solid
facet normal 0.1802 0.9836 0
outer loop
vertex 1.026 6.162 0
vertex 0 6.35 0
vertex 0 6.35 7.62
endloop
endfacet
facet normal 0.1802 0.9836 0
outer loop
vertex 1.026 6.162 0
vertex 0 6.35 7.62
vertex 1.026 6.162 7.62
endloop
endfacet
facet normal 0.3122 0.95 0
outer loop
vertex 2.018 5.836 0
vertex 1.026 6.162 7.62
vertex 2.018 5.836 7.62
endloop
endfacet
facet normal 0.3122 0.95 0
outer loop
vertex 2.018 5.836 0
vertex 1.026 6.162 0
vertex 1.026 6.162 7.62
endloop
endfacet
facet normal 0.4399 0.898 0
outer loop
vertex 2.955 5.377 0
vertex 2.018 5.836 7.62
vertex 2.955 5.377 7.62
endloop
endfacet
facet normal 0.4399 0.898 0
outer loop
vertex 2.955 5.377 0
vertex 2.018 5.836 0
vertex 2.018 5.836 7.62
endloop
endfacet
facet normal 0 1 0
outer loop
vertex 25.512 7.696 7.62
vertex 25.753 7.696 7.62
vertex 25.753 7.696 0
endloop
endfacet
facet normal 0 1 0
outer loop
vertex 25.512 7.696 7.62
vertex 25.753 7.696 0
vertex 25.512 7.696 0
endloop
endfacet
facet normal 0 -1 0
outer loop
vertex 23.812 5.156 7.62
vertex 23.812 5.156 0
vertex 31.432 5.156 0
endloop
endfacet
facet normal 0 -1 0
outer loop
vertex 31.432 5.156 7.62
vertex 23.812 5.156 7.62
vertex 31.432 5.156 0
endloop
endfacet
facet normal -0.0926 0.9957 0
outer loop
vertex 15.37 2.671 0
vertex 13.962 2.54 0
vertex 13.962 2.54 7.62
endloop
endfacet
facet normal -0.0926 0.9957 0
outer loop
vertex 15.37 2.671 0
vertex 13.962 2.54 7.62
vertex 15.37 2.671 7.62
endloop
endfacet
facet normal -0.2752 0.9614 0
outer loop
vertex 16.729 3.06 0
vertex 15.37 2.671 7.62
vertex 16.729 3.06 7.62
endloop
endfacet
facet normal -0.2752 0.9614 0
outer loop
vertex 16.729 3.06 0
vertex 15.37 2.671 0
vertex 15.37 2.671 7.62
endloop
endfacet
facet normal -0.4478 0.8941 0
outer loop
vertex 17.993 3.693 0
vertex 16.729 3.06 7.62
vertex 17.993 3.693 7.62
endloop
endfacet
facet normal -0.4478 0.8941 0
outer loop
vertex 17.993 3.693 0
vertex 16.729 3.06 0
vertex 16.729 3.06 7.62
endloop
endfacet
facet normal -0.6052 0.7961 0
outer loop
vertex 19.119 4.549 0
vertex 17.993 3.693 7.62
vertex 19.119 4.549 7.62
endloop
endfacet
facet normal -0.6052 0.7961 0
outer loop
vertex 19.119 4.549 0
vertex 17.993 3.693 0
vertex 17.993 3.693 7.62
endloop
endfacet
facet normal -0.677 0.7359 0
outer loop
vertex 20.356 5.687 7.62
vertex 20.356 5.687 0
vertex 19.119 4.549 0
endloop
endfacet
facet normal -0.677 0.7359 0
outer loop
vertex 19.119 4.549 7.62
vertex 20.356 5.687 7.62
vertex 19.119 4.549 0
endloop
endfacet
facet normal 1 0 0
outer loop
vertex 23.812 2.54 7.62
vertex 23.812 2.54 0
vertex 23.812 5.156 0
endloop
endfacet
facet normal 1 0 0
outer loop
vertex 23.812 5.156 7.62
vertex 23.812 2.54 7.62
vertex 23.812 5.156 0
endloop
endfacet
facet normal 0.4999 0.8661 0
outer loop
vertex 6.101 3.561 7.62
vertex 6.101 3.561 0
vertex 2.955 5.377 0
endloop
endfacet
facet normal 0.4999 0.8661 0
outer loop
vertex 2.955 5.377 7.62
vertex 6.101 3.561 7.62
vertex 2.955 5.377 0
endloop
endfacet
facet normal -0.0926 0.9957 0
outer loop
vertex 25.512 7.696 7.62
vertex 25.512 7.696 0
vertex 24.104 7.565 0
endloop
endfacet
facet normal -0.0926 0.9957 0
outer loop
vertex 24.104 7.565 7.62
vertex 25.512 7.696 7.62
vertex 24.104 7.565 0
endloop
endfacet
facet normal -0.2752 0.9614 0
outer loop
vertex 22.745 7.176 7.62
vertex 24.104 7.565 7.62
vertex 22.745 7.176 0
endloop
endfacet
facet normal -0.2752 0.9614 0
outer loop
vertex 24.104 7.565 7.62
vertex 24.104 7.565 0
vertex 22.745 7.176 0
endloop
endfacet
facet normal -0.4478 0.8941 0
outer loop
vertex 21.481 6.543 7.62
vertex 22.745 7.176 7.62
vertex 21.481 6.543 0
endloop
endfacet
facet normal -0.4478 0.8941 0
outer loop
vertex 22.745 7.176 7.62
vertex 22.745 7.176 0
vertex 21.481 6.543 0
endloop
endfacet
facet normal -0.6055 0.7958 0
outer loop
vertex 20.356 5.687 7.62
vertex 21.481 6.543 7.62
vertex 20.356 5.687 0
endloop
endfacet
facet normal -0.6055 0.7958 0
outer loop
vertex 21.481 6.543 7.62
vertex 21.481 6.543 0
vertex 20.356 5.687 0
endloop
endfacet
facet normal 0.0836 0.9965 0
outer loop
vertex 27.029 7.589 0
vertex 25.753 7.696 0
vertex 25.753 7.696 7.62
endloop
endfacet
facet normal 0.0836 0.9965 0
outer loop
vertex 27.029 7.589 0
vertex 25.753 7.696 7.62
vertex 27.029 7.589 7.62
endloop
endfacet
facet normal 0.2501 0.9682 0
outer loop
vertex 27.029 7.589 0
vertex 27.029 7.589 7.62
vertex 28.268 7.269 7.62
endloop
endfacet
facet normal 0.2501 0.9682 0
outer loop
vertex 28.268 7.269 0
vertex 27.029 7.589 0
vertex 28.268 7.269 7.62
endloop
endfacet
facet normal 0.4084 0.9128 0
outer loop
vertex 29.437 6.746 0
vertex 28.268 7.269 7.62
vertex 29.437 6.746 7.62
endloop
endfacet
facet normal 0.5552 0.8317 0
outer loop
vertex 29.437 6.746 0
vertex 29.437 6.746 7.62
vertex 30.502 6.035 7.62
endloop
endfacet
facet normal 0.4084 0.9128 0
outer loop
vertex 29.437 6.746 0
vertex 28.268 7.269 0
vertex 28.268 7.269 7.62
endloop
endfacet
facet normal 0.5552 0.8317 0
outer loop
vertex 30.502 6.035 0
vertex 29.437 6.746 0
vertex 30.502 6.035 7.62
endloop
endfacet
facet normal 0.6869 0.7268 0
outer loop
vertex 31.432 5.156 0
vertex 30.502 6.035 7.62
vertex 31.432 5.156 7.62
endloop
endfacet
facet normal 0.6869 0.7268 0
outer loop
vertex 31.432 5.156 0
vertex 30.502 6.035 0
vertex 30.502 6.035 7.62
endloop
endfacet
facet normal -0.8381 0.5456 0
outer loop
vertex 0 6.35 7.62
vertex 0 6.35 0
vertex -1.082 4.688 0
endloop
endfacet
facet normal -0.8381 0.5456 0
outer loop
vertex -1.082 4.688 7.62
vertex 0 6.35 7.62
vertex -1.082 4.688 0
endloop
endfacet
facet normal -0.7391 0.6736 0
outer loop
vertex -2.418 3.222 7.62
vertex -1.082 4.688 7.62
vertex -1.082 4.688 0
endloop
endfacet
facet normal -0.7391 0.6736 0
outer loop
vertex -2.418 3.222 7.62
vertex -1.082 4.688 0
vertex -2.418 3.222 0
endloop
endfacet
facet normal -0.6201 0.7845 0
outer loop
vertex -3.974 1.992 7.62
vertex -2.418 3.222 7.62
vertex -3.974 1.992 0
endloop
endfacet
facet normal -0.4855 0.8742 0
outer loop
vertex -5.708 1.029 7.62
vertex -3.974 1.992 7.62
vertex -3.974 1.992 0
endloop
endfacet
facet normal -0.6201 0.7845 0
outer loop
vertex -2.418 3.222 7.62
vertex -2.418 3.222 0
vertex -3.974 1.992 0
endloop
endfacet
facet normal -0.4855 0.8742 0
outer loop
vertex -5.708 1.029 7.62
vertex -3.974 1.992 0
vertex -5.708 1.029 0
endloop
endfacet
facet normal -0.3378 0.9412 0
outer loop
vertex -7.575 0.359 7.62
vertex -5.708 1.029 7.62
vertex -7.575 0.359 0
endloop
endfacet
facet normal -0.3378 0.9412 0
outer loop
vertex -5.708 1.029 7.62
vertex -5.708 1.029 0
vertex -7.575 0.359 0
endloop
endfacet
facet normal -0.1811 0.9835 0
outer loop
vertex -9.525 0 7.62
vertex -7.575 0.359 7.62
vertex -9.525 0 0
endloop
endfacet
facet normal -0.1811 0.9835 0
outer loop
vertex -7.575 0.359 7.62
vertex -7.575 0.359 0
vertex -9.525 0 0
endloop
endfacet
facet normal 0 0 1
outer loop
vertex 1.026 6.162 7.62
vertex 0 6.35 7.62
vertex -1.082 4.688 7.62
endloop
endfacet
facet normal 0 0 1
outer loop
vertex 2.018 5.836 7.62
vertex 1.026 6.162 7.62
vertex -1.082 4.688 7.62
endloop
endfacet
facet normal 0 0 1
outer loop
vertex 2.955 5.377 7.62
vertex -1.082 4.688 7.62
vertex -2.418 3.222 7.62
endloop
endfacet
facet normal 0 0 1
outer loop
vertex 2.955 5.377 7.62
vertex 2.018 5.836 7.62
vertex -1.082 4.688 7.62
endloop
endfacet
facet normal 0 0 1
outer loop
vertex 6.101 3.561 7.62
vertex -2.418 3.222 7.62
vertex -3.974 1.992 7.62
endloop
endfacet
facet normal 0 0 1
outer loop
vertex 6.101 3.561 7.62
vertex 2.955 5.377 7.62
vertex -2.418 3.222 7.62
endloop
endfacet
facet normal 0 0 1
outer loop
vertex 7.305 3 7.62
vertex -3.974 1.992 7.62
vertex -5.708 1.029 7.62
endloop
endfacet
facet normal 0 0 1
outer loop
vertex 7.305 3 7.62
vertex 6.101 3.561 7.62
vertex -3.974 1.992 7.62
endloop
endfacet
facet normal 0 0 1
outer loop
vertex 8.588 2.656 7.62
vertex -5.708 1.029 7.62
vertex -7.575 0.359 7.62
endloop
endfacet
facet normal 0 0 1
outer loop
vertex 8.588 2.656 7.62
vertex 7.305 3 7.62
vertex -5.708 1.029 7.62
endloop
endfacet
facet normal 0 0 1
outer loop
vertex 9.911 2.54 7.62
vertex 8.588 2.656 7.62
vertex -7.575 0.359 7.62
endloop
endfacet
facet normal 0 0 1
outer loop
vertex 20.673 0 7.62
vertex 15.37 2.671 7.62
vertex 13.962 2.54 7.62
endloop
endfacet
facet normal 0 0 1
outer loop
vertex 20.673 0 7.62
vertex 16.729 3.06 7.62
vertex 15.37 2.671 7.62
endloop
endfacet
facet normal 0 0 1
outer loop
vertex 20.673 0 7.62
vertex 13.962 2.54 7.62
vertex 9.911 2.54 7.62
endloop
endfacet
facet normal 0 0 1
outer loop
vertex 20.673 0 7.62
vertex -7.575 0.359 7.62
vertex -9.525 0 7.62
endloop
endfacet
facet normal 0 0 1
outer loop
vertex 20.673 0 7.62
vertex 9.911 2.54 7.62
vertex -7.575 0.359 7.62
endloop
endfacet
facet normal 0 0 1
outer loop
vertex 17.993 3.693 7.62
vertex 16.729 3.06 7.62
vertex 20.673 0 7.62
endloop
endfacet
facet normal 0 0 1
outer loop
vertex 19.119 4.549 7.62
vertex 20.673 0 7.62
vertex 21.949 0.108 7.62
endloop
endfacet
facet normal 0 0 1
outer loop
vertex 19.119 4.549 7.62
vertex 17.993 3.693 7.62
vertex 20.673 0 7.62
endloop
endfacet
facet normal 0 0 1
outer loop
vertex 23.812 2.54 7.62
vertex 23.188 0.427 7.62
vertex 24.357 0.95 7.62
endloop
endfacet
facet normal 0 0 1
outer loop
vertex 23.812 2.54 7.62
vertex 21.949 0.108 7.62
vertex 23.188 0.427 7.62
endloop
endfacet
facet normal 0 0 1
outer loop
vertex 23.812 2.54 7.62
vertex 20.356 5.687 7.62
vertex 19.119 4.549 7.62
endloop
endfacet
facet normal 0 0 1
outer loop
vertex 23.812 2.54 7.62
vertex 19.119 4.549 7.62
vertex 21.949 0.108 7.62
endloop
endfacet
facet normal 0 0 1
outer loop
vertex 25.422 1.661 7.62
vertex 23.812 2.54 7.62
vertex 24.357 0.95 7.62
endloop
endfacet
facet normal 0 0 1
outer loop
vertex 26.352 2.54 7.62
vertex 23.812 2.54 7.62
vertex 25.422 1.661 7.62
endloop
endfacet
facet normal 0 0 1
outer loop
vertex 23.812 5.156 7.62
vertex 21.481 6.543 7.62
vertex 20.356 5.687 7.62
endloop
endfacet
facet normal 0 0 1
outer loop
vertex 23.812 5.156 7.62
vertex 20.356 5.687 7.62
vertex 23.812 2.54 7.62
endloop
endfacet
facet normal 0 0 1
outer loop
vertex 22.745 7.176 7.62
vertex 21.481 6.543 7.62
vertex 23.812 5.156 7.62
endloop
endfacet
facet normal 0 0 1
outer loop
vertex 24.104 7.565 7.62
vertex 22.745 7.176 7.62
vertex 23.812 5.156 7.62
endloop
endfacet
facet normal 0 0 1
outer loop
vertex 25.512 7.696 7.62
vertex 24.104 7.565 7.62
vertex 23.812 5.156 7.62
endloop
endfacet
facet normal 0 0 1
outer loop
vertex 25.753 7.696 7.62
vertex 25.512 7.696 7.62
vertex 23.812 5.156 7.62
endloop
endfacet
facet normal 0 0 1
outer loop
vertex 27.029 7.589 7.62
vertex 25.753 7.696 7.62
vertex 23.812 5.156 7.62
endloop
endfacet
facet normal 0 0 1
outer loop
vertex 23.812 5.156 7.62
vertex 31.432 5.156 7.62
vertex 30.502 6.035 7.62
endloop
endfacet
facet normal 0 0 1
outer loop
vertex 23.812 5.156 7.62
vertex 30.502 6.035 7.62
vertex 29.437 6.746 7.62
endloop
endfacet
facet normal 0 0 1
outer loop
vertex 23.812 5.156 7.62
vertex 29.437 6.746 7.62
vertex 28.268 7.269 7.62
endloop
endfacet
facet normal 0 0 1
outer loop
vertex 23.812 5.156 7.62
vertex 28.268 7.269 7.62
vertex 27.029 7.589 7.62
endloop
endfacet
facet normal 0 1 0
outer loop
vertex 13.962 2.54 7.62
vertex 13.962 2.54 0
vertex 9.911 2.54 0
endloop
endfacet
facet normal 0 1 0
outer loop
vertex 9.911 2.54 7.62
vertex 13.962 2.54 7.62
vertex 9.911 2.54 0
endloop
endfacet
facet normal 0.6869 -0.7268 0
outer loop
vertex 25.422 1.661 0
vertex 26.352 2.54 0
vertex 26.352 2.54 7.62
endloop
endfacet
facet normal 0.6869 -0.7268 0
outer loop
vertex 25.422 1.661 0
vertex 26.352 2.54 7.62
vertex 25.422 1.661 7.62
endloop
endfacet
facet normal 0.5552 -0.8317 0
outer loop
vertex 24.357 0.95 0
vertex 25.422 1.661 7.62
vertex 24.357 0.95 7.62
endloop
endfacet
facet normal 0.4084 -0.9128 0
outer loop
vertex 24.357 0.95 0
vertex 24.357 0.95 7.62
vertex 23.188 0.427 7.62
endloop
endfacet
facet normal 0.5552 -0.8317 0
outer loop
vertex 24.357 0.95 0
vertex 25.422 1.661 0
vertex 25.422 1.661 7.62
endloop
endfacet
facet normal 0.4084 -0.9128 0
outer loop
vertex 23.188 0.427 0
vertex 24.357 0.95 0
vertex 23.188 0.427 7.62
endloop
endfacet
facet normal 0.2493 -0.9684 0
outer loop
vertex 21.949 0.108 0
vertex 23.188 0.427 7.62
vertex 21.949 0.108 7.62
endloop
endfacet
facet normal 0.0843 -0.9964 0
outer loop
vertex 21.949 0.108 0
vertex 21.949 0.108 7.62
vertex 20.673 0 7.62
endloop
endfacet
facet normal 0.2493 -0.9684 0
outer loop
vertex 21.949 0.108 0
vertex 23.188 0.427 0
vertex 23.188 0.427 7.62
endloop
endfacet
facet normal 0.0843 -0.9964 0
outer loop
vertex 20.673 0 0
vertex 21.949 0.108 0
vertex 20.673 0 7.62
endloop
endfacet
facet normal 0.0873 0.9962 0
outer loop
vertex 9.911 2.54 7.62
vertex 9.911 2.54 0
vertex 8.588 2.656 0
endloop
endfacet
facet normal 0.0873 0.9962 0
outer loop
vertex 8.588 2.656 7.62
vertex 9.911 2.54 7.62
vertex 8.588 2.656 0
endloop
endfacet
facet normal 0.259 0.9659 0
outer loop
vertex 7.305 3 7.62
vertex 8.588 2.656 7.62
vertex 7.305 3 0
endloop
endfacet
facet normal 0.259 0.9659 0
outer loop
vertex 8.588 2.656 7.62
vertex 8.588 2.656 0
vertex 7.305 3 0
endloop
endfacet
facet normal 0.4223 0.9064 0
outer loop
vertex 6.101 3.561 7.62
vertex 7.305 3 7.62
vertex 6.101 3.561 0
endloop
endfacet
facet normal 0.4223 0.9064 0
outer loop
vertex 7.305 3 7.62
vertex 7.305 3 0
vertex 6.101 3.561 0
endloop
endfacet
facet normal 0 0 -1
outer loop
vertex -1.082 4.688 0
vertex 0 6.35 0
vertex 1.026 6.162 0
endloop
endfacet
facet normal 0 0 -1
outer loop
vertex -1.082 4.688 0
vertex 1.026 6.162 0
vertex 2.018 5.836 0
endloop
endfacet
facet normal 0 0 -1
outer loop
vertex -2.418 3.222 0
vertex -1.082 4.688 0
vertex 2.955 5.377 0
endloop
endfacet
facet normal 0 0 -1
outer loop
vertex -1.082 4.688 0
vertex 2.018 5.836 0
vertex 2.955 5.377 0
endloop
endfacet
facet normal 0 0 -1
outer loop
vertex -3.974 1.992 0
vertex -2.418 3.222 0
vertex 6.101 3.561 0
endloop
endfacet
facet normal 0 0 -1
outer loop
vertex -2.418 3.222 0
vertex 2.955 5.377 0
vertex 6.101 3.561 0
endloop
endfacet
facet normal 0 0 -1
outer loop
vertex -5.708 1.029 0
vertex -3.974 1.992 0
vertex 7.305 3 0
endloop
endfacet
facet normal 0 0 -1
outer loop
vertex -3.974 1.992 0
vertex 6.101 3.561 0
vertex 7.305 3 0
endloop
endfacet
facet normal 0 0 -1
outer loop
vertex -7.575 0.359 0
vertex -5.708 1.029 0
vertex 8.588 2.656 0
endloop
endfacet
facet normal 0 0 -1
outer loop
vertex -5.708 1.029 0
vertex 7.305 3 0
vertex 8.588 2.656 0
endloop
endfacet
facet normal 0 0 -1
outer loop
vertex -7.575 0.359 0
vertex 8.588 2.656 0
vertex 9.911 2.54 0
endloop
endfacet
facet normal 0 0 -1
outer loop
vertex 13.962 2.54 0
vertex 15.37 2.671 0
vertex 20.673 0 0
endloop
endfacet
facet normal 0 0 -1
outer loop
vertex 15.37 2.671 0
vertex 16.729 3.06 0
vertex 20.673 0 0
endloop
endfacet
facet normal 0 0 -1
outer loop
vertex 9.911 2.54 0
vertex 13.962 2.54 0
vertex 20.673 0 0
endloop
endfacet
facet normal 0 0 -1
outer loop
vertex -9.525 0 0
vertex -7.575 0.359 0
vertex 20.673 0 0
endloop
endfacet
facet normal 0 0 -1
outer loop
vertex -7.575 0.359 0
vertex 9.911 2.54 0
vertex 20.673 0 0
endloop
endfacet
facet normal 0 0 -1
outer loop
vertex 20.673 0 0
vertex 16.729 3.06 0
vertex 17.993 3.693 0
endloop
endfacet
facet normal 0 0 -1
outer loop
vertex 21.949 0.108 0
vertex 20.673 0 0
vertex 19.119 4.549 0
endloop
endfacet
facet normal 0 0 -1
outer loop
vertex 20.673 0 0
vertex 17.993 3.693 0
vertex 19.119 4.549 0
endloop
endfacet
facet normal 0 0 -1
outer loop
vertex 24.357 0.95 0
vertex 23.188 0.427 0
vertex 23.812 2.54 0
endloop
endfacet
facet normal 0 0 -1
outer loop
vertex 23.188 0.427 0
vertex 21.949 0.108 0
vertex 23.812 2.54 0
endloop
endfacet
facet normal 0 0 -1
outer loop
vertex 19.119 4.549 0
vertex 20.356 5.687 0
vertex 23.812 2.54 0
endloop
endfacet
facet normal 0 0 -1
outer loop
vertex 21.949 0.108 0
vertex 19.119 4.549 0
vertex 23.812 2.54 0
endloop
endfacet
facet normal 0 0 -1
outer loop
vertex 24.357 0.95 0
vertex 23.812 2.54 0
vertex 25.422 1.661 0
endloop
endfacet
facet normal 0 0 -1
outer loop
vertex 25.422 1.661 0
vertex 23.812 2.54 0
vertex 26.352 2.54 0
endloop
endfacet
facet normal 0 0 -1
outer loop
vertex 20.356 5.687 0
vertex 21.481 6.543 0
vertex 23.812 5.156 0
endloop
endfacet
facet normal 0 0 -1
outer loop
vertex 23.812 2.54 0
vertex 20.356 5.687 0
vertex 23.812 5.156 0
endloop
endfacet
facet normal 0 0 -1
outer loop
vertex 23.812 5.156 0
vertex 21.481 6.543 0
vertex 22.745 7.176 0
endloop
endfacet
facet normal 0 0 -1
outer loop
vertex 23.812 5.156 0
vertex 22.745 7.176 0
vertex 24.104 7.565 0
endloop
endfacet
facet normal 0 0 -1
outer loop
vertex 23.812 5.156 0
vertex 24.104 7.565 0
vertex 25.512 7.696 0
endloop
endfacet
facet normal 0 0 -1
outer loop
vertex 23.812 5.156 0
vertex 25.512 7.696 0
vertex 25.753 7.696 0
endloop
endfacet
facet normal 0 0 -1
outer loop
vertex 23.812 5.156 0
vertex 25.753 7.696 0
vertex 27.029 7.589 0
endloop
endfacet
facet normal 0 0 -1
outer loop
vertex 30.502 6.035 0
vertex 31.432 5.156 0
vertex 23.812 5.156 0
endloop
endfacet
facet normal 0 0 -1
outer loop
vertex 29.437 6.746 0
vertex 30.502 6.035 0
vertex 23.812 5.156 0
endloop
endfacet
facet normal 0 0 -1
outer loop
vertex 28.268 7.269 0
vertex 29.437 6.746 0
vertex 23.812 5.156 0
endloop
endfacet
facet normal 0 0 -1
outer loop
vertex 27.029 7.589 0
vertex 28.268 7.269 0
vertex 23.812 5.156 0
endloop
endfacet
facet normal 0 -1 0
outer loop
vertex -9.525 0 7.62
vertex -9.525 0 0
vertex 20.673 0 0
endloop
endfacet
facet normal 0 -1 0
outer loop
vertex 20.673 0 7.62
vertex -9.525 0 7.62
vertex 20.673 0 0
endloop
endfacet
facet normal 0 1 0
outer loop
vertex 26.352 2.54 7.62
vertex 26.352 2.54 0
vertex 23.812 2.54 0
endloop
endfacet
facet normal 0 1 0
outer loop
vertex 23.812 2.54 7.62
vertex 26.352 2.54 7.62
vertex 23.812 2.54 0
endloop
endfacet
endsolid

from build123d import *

# Parameters (mm, degrees)
F1_DEPTH    = 7.62
F2_T1_DEPTH = 7.62
F2_T3_DEPTH = 7.62
F2_T5_DEPTH = 22.4683303368
F2_T7_DEPTH = 17.3475037725
F3_T1_DEPTH = 36.0180633142


# Not quite as in the source:
# - a fillet or chamfer that OpenCascade refuses, or shapes differently, is made with other operations: its cross-section is extruded or revolved along the edge and cut away or added


with BuildPart() as f1:
    # F0 (on Top) → F1 (new body)
    with BuildSketch(Plane.XY):
        with BuildLine():
            Line((-9.525, 0), (0, 0))
            Line((0, 0), (23.8125, 0))
            Line((23.8125, 0), (26.3525, 0))
            Line((26.3525, 0), (26.3525, 2.54))
            Line((26.3525, 2.54), (23.8125, 2.54))
            Line((23.8125, 2.54), (23.8125, 5.1562))
            Line((23.8125, 5.1562), (31.4325, 5.1562))
            Line((31.4325, 5.1562), (31.4325, 7.6962))
            Line((31.4325, 7.6962), (22.5425, 7.6962))
            Line((22.5425, 7.6962), (16.9319740389, 2.54))
            Line((16.9319740389, 2.54), (7.8691135768, 2.54))
            Line((7.8691135768, 2.54), (1.27, 6.35))
            Line((1.27, 6.35), (0, 6.35))
            ThreePointArc((0, 6.35), (-3.9738865155, 1.9920797732), (-9.525, 0))
        make_face()
    extrude(amount=F1_DEPTH)

    # F2: fillet of radius 7.62 on 4 edges, made by hand

    # F2_s2 → F2_t1 (join)
    with BuildSketch(Plane.XY):
        with BuildLine():
            ThreePointArc((13.9623079716, 2.54), (16.729273112, 3.0601194438), (19.1185079716, 4.5494740389))
            Line((19.1185079716, 4.5494740389), (16.9319740389, 2.54))
            Line((16.9319740389, 2.54), (13.9623079716, 2.54))
        make_face()
    extrude(amount=F2_T1_DEPTH)

    # F2_s4 → F2_t3 (join)
    with BuildSketch(Plane.XY):
        with BuildLine():
            ThreePointArc((9.9108864232, 2.54), (7.9386852995, 2.7996452037), (6.1008864232, 3.5608864232))
            Line((6.1008864232, 3.5608864232), (7.8691135768, 2.54))
            Line((7.8691135768, 2.54), (9.9108864232, 2.54))
        make_face()
    extrude(amount=F2_T3_DEPTH)

    # F2_s6 → F2_t5 (cut)
    with BuildSketch(Plane.XY.offset(-7.4241651684)):
        with BuildLine():
            ThreePointArc((25.5121660674, 7.6962), (22.7452009269, 7.1760805562), (20.3559660674, 5.6867259611))
            Line((20.3559660674, 5.6867259611), (22.5425, 7.6962))
            Line((22.5425, 7.6962), (25.5121660674, 7.6962))
        make_face()
    extrude(amount=F2_T5_DEPTH, mode=Mode.SUBTRACT)

    # F2_s8 → F2_t7 (cut)
    with BuildSketch(Plane.XY.offset(-4.8637518862)):
        with BuildLine():
            ThreePointArc((0, 6.35), (1.5275951478, 6.0160183482), (2.9548530765, 5.3772496228))
            Line((2.9548530765, 5.3772496228), (1.27, 6.35))
            Line((1.27, 6.35), (0, 6.35))
        make_face()
    extrude(amount=F2_T7_DEPTH, mode=Mode.SUBTRACT)

    # F3: fillet of radius 7.62 on 2 edges, made by hand

    # F3_s2 → F3_t1 (cut)
    with BuildSketch(Plane.XY.offset(-14.1990316571)):
        with BuildLine():
            ThreePointArc((25.7528873372, 7.6962), (28.8637393105, 7.0322764803), (31.4325, 5.1562))
            Line((31.4325, 5.1562), (31.4325, 7.6962))
            Line((31.4325, 7.6962), (25.7528873372, 7.6962))
        make_face()
        with BuildLine():
            ThreePointArc((26.3525, 2.54), (23.7837393105, 0.6639235197), (20.6728873372, 0))
            Line((20.6728873372, 0), (26.3525, 0))
            Line((26.3525, 0), (26.3525, 2.54))
        make_face()
    extrude(amount=F3_T1_DEPTH, mode=Mode.SUBTRACT)


solid = f1.part
